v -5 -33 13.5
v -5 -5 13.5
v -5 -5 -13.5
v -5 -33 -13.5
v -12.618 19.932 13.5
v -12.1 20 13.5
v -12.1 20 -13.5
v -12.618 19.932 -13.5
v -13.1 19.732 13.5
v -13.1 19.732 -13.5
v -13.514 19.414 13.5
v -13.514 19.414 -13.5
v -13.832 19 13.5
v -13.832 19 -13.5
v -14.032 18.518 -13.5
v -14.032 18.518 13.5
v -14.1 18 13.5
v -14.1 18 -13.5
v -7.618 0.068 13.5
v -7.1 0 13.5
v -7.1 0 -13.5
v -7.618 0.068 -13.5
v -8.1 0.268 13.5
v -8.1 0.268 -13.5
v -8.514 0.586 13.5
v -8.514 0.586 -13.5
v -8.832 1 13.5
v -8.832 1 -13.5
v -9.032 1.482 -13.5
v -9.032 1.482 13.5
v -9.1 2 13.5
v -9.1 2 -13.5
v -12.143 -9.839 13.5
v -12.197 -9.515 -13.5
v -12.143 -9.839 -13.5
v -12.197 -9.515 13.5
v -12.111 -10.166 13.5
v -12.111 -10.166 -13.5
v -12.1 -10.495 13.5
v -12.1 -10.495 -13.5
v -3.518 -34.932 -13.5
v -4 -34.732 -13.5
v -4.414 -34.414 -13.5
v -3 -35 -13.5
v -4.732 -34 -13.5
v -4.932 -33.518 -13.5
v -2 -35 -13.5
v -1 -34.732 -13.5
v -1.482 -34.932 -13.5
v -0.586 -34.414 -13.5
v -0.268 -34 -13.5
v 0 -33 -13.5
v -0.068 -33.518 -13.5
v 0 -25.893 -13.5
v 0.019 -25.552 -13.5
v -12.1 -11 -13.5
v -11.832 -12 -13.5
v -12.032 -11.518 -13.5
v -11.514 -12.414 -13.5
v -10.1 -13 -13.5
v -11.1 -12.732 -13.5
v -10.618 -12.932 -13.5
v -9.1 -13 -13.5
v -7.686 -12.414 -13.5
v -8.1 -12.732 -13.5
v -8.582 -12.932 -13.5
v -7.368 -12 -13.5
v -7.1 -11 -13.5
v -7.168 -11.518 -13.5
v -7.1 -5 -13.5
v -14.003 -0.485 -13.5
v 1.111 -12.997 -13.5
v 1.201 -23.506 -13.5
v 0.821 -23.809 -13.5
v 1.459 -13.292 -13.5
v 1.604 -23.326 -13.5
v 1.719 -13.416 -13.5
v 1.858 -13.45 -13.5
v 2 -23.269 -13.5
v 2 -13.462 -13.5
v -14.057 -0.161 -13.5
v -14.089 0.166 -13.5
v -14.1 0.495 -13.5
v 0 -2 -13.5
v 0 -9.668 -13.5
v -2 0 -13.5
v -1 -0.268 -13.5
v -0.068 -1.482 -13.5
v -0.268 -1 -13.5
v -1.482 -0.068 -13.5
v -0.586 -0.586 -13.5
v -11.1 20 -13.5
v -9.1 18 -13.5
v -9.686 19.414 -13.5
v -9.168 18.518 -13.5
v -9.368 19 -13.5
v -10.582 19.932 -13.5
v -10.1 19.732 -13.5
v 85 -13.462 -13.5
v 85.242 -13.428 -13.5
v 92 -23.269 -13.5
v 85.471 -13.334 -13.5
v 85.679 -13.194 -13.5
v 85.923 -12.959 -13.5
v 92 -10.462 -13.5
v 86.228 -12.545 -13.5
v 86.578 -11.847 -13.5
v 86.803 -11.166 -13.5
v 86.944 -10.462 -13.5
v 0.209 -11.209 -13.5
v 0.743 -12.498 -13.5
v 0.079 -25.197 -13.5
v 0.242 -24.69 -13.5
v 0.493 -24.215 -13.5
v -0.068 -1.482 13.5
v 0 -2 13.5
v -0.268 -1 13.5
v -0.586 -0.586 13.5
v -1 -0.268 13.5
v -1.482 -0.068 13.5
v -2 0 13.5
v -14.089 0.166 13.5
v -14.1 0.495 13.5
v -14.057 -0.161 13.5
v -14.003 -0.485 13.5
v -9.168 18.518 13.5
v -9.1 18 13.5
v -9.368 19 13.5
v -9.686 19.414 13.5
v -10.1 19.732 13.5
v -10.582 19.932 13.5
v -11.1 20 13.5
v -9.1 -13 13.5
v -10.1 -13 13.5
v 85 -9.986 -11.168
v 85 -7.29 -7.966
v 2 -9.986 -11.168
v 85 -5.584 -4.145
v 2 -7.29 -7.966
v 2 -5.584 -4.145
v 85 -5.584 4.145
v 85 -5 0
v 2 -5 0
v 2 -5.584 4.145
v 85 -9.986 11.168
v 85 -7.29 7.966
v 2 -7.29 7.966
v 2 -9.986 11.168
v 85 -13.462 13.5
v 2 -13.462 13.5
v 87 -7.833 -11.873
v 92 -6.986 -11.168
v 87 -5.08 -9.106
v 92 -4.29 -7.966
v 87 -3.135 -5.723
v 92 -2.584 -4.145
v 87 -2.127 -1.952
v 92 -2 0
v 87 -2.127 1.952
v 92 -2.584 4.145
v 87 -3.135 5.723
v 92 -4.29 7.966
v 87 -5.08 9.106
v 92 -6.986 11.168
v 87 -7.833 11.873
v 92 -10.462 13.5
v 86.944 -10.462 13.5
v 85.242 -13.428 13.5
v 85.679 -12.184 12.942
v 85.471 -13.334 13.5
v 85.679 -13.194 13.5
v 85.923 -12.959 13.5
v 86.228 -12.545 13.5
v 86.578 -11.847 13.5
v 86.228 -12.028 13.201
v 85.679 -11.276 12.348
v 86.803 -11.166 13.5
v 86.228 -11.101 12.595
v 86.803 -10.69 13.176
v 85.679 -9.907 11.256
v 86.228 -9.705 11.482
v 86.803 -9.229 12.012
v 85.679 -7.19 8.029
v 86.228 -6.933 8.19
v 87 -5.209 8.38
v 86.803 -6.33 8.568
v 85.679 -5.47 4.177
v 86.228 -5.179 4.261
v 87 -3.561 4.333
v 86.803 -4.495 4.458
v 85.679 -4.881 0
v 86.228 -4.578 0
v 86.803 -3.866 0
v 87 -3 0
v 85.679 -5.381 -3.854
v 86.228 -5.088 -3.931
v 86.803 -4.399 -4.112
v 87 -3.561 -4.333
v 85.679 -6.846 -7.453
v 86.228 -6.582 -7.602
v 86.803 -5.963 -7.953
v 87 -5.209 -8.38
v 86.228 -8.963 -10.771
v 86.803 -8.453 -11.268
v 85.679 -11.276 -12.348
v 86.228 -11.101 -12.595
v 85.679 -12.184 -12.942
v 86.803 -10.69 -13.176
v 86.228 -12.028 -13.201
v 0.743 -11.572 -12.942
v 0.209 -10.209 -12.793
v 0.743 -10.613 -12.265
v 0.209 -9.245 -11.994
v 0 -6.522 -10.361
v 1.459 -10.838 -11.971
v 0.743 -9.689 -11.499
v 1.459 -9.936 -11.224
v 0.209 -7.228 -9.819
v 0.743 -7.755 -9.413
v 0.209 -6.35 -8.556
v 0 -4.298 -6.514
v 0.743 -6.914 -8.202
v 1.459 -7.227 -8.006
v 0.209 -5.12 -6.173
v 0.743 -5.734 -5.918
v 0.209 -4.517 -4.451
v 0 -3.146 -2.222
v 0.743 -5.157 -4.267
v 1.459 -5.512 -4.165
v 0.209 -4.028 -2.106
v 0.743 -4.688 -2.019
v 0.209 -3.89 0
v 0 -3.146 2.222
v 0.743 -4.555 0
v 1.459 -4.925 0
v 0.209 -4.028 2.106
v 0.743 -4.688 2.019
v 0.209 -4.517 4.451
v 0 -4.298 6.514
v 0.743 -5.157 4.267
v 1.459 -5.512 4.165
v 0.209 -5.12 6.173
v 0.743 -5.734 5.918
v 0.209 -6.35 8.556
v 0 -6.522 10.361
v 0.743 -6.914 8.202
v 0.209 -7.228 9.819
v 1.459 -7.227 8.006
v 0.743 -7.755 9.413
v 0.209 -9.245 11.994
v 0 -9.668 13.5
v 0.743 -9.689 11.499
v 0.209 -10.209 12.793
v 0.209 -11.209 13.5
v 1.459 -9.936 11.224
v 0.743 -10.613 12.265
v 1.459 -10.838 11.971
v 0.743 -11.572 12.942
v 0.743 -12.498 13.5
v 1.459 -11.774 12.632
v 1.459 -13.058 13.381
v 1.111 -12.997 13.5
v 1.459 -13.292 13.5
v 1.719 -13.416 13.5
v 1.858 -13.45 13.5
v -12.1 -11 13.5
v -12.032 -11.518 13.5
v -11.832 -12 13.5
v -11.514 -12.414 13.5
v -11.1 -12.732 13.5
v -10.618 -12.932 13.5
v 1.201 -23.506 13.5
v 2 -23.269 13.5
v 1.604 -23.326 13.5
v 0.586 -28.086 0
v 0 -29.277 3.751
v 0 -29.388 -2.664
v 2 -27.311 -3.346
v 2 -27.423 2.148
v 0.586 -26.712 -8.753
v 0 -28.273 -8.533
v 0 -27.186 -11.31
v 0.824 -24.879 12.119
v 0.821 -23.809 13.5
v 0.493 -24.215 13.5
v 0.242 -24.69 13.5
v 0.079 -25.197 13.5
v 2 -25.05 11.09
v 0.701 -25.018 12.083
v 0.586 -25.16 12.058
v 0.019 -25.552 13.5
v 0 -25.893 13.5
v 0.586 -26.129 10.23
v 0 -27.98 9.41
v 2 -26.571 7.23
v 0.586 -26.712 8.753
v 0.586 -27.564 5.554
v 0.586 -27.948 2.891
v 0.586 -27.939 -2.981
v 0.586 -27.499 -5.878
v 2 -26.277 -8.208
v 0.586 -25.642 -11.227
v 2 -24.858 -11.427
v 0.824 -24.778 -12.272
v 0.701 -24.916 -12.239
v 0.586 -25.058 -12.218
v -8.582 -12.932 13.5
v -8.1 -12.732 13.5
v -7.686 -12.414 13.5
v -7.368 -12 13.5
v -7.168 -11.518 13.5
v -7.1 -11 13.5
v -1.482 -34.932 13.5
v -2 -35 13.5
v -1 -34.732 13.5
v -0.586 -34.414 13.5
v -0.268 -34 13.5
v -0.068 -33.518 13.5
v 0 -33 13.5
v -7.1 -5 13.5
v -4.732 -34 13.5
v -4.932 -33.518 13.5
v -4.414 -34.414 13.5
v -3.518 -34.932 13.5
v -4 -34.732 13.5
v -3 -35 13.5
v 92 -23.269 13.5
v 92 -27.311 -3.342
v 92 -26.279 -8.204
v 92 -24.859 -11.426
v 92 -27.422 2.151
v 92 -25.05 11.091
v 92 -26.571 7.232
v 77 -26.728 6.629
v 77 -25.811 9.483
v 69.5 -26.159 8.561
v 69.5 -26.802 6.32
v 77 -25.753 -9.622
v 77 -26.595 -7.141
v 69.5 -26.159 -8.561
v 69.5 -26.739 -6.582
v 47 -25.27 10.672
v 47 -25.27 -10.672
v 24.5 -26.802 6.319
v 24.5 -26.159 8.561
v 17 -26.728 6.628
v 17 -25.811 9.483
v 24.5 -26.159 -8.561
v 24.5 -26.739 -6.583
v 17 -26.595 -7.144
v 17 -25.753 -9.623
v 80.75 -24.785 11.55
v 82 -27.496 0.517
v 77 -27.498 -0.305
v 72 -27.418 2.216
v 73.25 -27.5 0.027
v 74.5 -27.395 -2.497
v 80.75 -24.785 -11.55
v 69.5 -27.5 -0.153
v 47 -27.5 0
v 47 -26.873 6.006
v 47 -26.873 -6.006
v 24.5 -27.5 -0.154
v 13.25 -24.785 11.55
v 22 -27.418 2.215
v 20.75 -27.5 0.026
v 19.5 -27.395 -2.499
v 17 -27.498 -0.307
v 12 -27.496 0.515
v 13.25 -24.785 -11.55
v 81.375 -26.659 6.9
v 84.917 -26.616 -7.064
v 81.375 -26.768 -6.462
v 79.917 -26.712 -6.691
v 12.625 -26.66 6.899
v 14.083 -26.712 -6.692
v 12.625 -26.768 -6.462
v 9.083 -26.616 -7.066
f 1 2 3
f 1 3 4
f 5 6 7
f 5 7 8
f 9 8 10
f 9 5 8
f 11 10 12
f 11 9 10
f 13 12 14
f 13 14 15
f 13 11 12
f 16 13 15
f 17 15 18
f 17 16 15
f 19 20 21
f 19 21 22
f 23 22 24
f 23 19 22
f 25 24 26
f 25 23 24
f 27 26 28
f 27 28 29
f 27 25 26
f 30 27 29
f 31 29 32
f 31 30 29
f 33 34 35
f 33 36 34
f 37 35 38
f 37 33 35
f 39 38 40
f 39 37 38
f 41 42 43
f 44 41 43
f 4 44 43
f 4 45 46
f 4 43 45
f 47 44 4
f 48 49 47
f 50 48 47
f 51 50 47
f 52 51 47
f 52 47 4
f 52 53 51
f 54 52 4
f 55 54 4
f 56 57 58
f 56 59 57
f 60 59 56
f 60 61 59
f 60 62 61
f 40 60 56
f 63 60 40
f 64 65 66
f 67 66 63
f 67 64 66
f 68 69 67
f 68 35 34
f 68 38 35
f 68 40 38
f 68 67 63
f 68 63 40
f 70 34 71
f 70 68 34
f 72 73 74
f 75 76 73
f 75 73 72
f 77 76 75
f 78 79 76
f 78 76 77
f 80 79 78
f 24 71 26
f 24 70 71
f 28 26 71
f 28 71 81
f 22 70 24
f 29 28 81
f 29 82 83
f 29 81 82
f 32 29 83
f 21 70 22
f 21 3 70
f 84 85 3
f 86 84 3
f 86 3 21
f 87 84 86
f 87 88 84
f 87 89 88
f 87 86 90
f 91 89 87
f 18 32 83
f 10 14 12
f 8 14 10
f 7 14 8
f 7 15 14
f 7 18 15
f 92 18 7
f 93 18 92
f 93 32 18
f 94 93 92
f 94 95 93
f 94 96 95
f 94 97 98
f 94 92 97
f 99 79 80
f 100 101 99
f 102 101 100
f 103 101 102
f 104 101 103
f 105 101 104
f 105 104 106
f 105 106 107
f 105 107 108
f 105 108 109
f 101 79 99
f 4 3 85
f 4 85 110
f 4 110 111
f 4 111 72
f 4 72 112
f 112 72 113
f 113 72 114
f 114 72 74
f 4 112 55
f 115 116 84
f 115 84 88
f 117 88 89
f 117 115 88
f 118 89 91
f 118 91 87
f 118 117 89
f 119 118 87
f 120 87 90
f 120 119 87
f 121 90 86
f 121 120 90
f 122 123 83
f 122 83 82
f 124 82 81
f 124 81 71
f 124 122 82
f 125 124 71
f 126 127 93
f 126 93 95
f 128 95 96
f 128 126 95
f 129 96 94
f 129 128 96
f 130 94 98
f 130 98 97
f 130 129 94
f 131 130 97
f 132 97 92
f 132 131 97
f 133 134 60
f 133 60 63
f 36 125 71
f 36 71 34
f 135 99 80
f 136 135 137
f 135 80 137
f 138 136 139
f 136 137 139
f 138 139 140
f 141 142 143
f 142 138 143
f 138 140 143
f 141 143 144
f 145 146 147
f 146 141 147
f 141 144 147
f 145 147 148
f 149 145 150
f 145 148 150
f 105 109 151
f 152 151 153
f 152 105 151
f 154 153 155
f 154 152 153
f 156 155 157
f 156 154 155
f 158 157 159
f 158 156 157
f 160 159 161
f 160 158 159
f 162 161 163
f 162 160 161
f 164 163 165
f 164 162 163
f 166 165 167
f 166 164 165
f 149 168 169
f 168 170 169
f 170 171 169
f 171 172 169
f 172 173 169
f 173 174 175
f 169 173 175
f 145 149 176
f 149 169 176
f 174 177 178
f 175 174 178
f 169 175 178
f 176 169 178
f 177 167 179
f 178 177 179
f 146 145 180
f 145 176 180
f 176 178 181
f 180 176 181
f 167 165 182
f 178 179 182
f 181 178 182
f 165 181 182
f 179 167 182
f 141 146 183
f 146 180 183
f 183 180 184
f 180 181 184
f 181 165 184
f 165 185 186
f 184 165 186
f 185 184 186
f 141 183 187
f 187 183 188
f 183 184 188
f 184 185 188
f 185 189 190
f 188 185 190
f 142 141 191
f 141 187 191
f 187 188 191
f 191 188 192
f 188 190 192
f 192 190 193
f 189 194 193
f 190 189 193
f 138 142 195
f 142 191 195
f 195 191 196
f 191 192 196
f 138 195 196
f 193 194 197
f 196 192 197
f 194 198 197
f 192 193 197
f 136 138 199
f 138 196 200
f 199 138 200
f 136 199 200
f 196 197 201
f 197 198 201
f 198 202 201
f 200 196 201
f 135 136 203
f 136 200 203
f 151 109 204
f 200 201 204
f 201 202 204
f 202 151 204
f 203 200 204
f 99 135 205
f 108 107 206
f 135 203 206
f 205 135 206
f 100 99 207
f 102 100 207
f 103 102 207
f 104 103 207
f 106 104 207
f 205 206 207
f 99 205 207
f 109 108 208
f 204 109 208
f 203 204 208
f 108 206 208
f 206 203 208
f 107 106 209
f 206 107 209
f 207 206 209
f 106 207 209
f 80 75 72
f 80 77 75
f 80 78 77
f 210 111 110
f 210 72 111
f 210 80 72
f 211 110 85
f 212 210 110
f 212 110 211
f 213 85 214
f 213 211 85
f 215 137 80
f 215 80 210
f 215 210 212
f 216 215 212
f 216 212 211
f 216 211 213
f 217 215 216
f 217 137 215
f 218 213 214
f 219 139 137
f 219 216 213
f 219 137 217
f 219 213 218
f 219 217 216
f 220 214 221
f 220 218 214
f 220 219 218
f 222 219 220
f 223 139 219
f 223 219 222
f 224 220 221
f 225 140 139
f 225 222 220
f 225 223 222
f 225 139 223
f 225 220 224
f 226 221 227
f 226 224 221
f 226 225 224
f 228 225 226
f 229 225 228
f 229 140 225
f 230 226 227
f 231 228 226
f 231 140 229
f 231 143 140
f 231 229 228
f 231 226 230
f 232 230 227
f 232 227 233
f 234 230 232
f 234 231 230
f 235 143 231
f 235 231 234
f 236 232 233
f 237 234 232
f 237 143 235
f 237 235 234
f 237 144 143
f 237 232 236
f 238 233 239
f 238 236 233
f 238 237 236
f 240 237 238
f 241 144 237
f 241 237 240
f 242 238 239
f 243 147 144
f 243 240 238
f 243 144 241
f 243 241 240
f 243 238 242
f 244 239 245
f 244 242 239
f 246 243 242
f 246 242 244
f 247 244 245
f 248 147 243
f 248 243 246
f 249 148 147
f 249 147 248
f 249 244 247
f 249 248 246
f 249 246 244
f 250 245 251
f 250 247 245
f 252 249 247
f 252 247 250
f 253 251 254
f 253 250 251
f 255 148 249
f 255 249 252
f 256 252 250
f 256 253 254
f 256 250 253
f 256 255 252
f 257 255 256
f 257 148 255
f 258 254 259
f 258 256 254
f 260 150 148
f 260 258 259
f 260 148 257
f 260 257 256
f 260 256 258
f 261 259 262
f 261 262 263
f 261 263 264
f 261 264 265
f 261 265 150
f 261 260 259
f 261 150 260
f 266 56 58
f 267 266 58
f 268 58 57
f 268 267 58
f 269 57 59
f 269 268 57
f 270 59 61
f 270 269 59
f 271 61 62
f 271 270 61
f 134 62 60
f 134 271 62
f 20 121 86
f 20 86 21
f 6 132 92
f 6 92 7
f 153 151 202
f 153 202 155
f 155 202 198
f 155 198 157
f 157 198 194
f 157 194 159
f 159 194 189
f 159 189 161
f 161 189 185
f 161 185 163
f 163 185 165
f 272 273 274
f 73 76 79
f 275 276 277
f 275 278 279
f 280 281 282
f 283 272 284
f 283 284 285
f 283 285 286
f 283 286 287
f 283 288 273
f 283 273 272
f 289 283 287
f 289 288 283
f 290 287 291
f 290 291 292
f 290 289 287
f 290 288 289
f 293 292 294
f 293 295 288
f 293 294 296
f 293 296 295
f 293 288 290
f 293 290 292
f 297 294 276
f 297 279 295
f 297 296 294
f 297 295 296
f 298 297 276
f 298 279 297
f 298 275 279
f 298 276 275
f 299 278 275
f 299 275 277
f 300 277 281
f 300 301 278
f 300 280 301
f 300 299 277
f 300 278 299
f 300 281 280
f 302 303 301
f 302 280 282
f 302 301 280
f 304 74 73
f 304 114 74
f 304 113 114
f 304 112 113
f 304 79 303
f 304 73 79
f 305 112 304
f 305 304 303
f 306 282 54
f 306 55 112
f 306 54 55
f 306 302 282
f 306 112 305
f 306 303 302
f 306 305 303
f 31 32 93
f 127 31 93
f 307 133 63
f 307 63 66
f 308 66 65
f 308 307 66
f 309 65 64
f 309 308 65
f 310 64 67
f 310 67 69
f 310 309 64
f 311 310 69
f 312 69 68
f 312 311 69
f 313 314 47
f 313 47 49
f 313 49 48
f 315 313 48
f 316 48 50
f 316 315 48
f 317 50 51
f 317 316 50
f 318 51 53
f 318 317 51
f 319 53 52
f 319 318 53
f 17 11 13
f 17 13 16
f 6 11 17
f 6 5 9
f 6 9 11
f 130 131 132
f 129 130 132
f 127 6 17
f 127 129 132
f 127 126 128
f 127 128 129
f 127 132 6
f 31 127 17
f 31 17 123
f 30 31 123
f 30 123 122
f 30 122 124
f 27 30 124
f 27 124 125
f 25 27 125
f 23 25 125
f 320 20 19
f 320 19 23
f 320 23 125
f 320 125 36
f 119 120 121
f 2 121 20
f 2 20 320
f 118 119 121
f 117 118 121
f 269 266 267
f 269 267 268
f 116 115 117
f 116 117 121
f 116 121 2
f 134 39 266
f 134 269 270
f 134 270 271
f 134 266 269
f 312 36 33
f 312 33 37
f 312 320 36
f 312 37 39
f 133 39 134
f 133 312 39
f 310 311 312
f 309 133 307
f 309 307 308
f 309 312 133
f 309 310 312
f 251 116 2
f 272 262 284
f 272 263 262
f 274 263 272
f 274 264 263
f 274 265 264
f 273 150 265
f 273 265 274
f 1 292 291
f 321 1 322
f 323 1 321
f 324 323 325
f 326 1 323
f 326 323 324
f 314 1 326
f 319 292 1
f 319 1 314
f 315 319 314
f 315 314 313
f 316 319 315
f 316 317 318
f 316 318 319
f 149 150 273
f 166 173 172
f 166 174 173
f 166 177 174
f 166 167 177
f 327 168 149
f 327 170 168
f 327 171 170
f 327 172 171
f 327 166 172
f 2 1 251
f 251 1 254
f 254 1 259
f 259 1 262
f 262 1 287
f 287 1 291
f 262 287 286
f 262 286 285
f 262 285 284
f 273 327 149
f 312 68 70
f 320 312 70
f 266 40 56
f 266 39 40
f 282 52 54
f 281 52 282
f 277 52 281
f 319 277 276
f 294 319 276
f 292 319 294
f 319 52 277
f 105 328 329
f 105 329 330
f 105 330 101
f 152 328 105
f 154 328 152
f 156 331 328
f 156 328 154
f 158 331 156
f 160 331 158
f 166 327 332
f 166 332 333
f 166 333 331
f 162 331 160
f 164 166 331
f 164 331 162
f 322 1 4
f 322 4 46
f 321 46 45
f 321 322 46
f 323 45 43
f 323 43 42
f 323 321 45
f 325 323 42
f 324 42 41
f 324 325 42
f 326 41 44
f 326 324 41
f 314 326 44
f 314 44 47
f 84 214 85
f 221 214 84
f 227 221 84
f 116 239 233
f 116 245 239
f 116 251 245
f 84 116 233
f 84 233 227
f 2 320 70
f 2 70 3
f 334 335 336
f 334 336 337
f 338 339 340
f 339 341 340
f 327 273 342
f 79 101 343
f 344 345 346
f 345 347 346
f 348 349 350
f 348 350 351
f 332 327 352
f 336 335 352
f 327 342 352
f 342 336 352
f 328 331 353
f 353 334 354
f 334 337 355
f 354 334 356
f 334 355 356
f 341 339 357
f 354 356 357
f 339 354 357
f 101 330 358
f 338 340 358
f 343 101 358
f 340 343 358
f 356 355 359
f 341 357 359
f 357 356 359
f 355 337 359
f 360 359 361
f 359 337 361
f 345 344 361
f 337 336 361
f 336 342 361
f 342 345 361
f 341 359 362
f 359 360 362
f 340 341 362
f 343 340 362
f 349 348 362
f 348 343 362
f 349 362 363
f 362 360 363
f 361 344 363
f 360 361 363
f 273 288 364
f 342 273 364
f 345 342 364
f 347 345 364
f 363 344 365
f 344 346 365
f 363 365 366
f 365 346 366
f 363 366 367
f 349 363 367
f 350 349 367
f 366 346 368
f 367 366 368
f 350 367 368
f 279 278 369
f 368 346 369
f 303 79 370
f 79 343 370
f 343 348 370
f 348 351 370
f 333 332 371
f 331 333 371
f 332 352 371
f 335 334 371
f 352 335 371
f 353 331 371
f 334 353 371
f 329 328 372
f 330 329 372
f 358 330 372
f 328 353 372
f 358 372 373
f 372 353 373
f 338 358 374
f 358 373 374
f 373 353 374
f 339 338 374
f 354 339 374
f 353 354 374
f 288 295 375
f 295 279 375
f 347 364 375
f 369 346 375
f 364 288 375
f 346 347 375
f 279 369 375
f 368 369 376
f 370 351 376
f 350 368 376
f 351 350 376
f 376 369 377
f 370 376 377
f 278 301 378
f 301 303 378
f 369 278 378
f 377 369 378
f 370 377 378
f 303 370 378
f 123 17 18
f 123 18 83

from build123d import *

# Parameters (mm, degrees)
F3_DEPTH = 13.5
F5_DEPTH = 92
F7_DEPTH = 5
F8_R     = 2


with BuildPart() as f3:
    # F2 (on Top) → F3 (new body, symmetric)
    with BuildSketch(Plane.XY):
        with BuildLine():
            ThreePointArc((-12.1, -11), (-11.5142135624, -12.4142135624), (-10.1, -13))
            Line((-10.1, -13), (-9.1, -13))
            ThreePointArc((-9.1, -13), (-7.6857864376, -12.4142135624), (-7.1, -11))
            Line((-7.1, -11), (-7.1, -5))
            Line((-7.1, -5), (-5, -5))
            Line((-5, -5), (-5, -33))
            ThreePointArc((-5, -33), (-4.4142135624, -34.4142135624), (-3, -35))
            Line((-3, -35), (-2, -35))
            ThreePointArc((-2, -35), (-0.5857864376, -34.4142135624), (0, -33))
            Line((0, -33), (0, -2))
            ThreePointArc((0, -2), (-0.5857864376, -0.5857864376), (-2, 0))
            Line((-2, 0), (-7.1, 0))
            ThreePointArc((-7.1, 0), (-8.5142135624, 0.5857864376), (-9.1, 2))
            Line((-9.1, 2), (-9.1, 18))
            ThreePointArc((-9.1, 18), (-9.6857864376, 19.4142135624), (-11.1, 20))
            Line((-11.1, 20), (-12.1, 20))
            ThreePointArc((-12.1, 20), (-13.5142135624, 19.4142135624), (-14.1, 18))
            Line((-14.1, 18), (-14.1, 0.495097568))
            ThreePointArc((-14.1, 0.495097568), (-14.0756666333, 0.0024094781), (-14.0029033785, -0.4854831077))
            Line((-14.0029033785, -0.4854831077), (-12.1970966215, -9.5145168923))
            ThreePointArc((-12.1970966215, -9.5145168923), (-12.1243333667, -10.0024094781), (-12.1, -10.495097568))
            Line((-12.1, -10.495097568), (-12.1, -11))
        make_face()
    extrude(amount=F3_DEPTH, both=True)

    # F4 (on face) → F5 (join)
    with BuildSketch(Plane.YZ):
        with BuildLine():
            Line((-23.2691742077, -13.5), (-16.7308257923, -13.5))
            add(Edge.make_bspline(
                [(-16.7308257923, -13.5), (-2.7938199597, 0), (-16.7308257923, 13.5)],
                knots=[0.4510268118, 0.4510268118, 0.4510268118, 2.6905658418, 2.6905658418, 2.6905658418], degree=2, weights=[1, 0.4358898944, 1]))
            Line((-16.7308257923, 13.5), (-23.2691742077, 13.5))
            add(Edge.make_bspline(
                [(-23.2691742077, 13.5), (-37.2061800403, 0), (-23.2691742077, -13.5)],
                knots=[3.5926194654, 3.5926194654, 3.5926194654, 5.8321584954, 5.8321584954, 5.8321584954], degree=2, weights=[1, 0.4358898944, 1]))
        make_face()
        with BuildLine():
            Line((-16.7308257923, -13.5), (-13.4616515847, -13.5))
            ThreePointArc((-13.4616515847, -13.5), (-5, 0), (-13.4616515847, 13.5))
            Line((-13.4616515847, 13.5), (-16.7308257923, 13.5))
            add(Edge.make_bspline(
                [(-16.7308257923, -13.5), (-2.7938199597, 0), (-16.7308257923, 13.5)],
                knots=[0.4510268118, 0.4510268118, 0.4510268118, 2.6905658418, 2.6905658418, 2.6905658418], degree=2, weights=[1, 0.4358898944, 1]))
        make_face()
    extrude(amount=F5_DEPTH)

    # F6 (on face) → F7 (join)
    with BuildSketch(Plane.YZ.offset(92)):
        with BuildLine():
            Line((-10.4616515847, 13.5), (-13.4616515847, 13.5))
            ThreePointArc((-13.4616515847, 13.5), (-5, 0), (-13.4616515847, -13.5))
            Line((-13.4616515847, -13.5), (-10.4616515847, -13.5))
            ThreePointArc((-10.4616515847, -13.5), (-2, 0), (-10.4616515847, 13.5))
        make_face()
    extrude(amount=-F7_DEPTH)

    # F8
    f8_edges = [f3.edges().sort_by_distance(p)[0] for p in [
        (0, -5, 0),
        (0, -27.5, -0.000816),
        (87, -5, 0),
    ]]
    fillet(f8_edges, radius=F8_R)


solid = f3.part
